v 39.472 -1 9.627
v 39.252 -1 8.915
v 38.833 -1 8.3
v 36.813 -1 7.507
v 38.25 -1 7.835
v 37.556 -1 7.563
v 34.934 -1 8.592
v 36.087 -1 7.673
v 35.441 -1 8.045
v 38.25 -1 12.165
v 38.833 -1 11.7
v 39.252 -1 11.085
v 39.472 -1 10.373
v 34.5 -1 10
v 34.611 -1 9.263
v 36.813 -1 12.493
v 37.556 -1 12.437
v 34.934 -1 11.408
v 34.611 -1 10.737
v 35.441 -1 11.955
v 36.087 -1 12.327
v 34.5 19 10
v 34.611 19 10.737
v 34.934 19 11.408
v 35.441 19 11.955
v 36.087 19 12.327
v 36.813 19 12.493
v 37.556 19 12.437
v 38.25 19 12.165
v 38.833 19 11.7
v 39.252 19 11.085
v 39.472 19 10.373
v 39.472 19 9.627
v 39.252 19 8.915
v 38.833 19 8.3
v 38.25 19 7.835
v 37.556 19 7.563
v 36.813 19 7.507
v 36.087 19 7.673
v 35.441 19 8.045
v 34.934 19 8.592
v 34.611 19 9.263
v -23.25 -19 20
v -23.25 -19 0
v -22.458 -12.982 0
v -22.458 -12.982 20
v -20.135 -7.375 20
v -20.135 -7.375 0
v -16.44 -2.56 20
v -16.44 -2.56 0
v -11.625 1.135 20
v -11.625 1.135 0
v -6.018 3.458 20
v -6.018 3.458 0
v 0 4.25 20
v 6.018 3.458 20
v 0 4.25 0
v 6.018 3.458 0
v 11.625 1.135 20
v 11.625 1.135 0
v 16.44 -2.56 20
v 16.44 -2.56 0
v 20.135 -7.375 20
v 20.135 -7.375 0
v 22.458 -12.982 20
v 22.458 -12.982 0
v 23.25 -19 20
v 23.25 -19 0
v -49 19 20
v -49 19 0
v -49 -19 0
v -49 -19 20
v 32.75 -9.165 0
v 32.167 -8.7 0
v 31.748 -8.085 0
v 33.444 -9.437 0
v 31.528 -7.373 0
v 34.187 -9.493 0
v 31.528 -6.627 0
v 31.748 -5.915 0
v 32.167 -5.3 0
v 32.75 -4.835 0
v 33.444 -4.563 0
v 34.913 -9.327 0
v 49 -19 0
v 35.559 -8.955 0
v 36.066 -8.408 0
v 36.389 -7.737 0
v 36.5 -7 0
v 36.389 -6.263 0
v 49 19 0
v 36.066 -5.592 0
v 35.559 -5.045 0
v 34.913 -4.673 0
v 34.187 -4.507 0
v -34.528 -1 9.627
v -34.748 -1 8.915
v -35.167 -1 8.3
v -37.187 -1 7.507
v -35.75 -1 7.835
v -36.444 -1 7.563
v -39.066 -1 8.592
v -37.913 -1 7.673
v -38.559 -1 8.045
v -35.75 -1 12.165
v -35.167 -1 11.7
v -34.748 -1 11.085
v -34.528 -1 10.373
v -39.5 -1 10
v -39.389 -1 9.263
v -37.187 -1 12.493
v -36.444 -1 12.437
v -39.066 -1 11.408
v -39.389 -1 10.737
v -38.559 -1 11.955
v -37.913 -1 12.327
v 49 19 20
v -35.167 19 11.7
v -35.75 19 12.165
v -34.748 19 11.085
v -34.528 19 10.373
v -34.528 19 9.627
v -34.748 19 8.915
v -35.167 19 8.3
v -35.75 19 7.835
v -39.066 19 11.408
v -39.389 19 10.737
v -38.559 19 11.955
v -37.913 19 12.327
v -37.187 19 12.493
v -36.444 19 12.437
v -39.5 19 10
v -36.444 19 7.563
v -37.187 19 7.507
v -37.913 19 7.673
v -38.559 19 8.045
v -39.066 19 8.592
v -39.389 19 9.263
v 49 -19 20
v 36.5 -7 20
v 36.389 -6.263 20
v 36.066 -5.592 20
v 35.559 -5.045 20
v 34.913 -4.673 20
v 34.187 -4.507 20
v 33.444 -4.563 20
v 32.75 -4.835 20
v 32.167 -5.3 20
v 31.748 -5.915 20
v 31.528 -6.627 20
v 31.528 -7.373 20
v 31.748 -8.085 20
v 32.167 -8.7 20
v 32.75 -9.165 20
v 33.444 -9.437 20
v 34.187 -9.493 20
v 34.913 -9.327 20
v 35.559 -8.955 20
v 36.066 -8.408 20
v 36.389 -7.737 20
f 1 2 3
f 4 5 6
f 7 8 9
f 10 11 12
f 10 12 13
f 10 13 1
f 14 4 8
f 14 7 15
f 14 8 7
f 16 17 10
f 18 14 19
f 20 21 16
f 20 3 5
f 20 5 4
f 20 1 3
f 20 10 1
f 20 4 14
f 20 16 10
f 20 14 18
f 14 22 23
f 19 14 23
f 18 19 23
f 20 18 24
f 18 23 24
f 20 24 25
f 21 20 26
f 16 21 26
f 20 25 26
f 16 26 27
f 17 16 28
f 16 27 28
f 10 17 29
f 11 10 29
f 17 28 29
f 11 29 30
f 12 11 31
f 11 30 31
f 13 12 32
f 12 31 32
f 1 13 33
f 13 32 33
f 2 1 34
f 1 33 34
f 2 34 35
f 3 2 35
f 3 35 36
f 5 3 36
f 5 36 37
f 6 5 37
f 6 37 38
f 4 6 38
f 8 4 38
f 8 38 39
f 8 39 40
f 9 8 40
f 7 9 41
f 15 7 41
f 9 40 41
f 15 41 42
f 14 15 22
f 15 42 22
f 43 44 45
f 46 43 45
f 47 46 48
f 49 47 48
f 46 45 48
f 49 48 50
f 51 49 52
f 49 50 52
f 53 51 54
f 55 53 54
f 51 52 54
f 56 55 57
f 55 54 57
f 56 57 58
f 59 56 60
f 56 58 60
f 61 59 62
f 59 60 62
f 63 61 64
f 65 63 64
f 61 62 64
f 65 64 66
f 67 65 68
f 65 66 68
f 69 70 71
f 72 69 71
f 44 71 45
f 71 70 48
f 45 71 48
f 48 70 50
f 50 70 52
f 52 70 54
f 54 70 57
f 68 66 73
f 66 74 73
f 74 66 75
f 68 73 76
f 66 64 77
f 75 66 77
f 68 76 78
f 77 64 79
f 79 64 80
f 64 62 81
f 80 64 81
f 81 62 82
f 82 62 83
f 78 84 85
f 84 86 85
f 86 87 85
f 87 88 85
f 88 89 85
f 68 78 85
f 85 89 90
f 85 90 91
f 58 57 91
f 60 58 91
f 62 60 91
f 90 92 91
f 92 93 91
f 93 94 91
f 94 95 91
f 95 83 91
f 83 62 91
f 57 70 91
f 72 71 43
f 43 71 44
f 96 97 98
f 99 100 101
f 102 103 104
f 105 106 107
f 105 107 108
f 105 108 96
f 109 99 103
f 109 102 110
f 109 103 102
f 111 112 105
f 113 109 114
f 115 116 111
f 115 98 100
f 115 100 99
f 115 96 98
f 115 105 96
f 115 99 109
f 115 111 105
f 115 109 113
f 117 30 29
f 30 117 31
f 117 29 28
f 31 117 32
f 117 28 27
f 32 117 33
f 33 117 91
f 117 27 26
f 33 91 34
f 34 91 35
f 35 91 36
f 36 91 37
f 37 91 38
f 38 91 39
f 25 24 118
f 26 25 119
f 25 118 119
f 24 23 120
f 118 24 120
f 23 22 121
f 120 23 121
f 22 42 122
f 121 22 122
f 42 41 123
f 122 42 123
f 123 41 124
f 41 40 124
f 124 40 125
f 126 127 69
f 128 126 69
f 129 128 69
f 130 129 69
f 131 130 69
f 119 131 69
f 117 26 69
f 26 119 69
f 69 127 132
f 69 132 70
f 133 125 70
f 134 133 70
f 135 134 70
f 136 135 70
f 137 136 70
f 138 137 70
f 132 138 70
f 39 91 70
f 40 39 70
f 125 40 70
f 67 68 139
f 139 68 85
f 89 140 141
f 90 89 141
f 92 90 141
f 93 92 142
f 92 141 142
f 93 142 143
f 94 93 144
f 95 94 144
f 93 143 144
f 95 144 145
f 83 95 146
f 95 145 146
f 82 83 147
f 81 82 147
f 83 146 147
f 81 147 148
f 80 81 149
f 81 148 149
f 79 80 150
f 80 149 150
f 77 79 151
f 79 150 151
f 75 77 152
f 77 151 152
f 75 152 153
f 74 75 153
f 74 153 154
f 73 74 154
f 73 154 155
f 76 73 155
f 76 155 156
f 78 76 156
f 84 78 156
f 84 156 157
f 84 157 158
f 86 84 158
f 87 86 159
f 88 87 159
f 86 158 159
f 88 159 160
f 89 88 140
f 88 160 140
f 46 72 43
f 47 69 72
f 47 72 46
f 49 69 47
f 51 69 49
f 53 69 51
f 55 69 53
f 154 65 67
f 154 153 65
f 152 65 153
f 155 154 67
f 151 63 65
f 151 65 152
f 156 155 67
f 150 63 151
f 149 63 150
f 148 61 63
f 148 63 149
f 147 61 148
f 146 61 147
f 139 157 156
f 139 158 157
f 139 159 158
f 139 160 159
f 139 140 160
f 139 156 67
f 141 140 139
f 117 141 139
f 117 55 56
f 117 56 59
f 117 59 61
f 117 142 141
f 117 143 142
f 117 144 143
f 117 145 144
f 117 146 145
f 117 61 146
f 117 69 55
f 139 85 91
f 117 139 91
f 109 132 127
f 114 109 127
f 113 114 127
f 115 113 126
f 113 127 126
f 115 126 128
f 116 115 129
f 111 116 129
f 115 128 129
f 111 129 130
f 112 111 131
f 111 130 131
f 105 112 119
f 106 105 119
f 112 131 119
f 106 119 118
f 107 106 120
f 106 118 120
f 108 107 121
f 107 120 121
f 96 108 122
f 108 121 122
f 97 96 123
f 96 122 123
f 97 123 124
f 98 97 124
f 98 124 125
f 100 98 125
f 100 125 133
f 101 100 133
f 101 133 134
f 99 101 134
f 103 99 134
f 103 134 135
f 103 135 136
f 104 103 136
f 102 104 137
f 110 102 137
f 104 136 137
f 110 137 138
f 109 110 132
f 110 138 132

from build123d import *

# Parameters (mm, degrees)
F1_DEPTH = 20
F2_R     = 2.5
F3_DEPTH = 20
F4_R     = 2.5
F5_DEPTH = 20


with BuildPart() as f1:
    # F0 (on Top) → F1 (new body)
    with BuildSketch(Plane.XY):
        with BuildLine():
            Line((49, -19), (49, 19))
            Line((49, 19), (-49, 19))
            Line((-49, 19), (-49, -19))
            Line((-49, -19), (-23.25, -19))
            ThreePointArc((-23.25, -19), (0, 4.25), (23.25, -19))
            Line((23.25, -19), (49, -19))
        make_face()
    extrude(amount=F1_DEPTH)

    # F2 (on face) → F3 (cut)
    with BuildSketch(Plane(origin=(0, 19, 0), x_dir=(-1, 0, 0), z_dir=(0, 1, 0))):
        with Locations((-37, 10)):
            Circle(F2_R)
        with Locations((37, 10)):
            Circle(F2_R)
    extrude(amount=-F3_DEPTH, mode=Mode.SUBTRACT)

    # F4 (on face) → F5 (cut)
    with BuildSketch(Plane.XY.offset(20)):
        with Locations((34, -7)):
            Circle(F4_R)
    extrude(amount=-F5_DEPTH, mode=Mode.SUBTRACT)


solid = f1.part
